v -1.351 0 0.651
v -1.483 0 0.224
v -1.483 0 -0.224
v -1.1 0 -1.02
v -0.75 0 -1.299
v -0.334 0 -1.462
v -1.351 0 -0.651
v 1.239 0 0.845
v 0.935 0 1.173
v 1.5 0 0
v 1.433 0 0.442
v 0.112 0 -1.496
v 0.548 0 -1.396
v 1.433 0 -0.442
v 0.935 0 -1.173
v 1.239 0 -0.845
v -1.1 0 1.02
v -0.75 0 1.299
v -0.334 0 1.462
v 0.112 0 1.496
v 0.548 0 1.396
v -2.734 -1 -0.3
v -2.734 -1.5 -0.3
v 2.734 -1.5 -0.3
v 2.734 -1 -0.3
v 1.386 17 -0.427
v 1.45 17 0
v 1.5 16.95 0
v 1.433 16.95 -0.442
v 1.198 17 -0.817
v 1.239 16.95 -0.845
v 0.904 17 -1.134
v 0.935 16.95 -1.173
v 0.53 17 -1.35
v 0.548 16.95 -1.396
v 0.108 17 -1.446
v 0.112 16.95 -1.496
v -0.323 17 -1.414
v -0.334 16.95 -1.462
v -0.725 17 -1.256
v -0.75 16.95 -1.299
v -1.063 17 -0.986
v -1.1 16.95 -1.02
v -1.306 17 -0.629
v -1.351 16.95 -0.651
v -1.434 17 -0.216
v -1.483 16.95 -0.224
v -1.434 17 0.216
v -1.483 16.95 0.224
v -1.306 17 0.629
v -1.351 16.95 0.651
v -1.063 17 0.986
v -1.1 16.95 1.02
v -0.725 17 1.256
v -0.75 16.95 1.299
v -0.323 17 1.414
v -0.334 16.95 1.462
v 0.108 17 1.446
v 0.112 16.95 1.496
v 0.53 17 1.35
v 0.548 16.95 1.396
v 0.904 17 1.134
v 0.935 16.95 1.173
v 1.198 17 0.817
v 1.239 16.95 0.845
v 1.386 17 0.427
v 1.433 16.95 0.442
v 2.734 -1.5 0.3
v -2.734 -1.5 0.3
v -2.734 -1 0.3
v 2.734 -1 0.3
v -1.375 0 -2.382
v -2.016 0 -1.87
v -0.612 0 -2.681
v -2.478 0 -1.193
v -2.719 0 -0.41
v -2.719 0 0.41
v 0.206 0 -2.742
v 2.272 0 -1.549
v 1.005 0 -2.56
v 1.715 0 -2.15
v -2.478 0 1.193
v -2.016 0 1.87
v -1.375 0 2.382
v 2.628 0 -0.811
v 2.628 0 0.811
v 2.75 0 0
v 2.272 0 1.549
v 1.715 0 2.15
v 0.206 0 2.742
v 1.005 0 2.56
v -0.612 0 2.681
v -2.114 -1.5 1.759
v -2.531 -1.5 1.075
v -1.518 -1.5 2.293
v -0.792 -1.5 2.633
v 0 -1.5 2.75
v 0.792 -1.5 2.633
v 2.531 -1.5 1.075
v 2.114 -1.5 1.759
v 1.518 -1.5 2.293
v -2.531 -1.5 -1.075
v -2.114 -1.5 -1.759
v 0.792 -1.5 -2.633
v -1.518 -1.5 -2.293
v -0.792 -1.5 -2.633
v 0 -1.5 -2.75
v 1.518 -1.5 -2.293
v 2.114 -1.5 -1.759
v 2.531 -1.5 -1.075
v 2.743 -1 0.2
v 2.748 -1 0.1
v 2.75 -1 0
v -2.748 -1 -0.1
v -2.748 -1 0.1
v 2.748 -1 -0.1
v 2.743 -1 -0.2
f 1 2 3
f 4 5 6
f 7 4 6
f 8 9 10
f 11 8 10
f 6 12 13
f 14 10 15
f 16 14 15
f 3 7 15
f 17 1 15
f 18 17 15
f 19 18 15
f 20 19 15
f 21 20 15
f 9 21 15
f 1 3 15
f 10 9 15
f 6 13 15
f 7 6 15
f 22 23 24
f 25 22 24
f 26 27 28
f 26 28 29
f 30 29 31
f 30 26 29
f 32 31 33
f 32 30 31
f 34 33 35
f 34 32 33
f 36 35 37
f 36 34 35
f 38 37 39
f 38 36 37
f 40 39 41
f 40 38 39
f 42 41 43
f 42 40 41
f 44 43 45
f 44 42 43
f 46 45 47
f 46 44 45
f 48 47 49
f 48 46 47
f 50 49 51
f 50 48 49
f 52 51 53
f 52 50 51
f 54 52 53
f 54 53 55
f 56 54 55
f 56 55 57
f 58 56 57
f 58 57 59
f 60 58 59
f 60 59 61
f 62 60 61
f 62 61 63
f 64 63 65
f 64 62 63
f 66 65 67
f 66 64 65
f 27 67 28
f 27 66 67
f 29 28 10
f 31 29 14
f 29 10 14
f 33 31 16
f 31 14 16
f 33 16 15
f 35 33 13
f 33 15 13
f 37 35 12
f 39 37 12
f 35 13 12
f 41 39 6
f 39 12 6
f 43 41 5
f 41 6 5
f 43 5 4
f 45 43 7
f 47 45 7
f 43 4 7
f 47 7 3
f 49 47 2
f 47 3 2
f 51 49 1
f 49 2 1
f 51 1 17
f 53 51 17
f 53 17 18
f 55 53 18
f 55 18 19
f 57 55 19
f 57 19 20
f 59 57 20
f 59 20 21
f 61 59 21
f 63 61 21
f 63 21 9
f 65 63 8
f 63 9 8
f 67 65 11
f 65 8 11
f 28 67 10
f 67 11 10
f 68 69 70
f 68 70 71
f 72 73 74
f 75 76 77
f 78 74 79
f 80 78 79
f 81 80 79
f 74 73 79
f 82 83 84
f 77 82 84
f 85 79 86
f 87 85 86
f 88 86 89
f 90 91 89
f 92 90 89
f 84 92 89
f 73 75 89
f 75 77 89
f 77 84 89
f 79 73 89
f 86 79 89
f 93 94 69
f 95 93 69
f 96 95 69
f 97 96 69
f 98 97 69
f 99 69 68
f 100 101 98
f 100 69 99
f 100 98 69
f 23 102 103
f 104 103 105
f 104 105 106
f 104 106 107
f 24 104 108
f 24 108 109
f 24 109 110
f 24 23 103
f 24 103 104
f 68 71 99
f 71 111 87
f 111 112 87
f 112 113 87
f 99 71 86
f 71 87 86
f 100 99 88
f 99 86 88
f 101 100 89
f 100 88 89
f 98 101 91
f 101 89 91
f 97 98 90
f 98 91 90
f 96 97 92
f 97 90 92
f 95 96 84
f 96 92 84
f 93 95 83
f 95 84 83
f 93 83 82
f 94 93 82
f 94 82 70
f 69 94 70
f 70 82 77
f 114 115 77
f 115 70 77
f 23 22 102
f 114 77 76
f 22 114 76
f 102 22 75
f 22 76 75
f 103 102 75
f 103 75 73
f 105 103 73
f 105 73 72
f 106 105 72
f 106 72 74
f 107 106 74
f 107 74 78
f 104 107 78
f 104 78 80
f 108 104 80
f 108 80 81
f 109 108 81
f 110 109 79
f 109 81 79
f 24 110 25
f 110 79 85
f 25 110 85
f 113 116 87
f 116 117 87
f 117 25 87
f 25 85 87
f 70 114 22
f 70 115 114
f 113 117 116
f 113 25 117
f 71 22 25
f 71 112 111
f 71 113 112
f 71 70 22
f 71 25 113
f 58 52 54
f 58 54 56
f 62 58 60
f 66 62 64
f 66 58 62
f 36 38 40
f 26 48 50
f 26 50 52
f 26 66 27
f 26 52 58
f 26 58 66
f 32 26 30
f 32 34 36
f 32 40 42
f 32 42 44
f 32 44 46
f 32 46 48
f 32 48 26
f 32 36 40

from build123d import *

# Parameters (mm, degrees)
SKETCH1_R           = 1.5
BOSS_EXTRUDE1_DEPTH = 17
SKETCH2_R           = 2.75
BOSS_EXTRUDE2_DEPTH = 1.5
SKETCH3_W           = 8.196351728
SKETCH3_H           = 0.6
CUT_EXTRUDE1_DEPTH  = 0.5
CHAMFER1_SIZE       = 0.05


with BuildPart() as part:
    # Sketch1 → Boss-Extrude1 (new body)
    with BuildSketch(Plane(origin=(0, 0, 0), x_dir=(1, 0, 0), z_dir=(0, 1, 0))):
        Circle(SKETCH1_R)
    extrude(amount=BOSS_EXTRUDE1_DEPTH)

    # Chamfer1
    chamfer1_edges = [part.edges().sort_by_distance(p)[0] for p in [
        (-1.5, 17, 0),
    ]]
    chamfer(chamfer1_edges, length=CHAMFER1_SIZE)


with BuildPart() as body_2:
    # Sketch2 → Boss-Extrude2 (new body)
    with BuildSketch(Plane.XZ):
        Circle(SKETCH2_R)
    extrude(amount=BOSS_EXTRUDE2_DEPTH)

    # Sketch3 → Cut-Extrude1 (cut)
    with BuildSketch(Plane.XZ.offset(1.5)):
        Rectangle(SKETCH3_W, SKETCH3_H)
    extrude(amount=-CUT_EXTRUDE1_DEPTH, mode=Mode.SUBTRACT)


solid = Compound([part.part, body_2.part])
